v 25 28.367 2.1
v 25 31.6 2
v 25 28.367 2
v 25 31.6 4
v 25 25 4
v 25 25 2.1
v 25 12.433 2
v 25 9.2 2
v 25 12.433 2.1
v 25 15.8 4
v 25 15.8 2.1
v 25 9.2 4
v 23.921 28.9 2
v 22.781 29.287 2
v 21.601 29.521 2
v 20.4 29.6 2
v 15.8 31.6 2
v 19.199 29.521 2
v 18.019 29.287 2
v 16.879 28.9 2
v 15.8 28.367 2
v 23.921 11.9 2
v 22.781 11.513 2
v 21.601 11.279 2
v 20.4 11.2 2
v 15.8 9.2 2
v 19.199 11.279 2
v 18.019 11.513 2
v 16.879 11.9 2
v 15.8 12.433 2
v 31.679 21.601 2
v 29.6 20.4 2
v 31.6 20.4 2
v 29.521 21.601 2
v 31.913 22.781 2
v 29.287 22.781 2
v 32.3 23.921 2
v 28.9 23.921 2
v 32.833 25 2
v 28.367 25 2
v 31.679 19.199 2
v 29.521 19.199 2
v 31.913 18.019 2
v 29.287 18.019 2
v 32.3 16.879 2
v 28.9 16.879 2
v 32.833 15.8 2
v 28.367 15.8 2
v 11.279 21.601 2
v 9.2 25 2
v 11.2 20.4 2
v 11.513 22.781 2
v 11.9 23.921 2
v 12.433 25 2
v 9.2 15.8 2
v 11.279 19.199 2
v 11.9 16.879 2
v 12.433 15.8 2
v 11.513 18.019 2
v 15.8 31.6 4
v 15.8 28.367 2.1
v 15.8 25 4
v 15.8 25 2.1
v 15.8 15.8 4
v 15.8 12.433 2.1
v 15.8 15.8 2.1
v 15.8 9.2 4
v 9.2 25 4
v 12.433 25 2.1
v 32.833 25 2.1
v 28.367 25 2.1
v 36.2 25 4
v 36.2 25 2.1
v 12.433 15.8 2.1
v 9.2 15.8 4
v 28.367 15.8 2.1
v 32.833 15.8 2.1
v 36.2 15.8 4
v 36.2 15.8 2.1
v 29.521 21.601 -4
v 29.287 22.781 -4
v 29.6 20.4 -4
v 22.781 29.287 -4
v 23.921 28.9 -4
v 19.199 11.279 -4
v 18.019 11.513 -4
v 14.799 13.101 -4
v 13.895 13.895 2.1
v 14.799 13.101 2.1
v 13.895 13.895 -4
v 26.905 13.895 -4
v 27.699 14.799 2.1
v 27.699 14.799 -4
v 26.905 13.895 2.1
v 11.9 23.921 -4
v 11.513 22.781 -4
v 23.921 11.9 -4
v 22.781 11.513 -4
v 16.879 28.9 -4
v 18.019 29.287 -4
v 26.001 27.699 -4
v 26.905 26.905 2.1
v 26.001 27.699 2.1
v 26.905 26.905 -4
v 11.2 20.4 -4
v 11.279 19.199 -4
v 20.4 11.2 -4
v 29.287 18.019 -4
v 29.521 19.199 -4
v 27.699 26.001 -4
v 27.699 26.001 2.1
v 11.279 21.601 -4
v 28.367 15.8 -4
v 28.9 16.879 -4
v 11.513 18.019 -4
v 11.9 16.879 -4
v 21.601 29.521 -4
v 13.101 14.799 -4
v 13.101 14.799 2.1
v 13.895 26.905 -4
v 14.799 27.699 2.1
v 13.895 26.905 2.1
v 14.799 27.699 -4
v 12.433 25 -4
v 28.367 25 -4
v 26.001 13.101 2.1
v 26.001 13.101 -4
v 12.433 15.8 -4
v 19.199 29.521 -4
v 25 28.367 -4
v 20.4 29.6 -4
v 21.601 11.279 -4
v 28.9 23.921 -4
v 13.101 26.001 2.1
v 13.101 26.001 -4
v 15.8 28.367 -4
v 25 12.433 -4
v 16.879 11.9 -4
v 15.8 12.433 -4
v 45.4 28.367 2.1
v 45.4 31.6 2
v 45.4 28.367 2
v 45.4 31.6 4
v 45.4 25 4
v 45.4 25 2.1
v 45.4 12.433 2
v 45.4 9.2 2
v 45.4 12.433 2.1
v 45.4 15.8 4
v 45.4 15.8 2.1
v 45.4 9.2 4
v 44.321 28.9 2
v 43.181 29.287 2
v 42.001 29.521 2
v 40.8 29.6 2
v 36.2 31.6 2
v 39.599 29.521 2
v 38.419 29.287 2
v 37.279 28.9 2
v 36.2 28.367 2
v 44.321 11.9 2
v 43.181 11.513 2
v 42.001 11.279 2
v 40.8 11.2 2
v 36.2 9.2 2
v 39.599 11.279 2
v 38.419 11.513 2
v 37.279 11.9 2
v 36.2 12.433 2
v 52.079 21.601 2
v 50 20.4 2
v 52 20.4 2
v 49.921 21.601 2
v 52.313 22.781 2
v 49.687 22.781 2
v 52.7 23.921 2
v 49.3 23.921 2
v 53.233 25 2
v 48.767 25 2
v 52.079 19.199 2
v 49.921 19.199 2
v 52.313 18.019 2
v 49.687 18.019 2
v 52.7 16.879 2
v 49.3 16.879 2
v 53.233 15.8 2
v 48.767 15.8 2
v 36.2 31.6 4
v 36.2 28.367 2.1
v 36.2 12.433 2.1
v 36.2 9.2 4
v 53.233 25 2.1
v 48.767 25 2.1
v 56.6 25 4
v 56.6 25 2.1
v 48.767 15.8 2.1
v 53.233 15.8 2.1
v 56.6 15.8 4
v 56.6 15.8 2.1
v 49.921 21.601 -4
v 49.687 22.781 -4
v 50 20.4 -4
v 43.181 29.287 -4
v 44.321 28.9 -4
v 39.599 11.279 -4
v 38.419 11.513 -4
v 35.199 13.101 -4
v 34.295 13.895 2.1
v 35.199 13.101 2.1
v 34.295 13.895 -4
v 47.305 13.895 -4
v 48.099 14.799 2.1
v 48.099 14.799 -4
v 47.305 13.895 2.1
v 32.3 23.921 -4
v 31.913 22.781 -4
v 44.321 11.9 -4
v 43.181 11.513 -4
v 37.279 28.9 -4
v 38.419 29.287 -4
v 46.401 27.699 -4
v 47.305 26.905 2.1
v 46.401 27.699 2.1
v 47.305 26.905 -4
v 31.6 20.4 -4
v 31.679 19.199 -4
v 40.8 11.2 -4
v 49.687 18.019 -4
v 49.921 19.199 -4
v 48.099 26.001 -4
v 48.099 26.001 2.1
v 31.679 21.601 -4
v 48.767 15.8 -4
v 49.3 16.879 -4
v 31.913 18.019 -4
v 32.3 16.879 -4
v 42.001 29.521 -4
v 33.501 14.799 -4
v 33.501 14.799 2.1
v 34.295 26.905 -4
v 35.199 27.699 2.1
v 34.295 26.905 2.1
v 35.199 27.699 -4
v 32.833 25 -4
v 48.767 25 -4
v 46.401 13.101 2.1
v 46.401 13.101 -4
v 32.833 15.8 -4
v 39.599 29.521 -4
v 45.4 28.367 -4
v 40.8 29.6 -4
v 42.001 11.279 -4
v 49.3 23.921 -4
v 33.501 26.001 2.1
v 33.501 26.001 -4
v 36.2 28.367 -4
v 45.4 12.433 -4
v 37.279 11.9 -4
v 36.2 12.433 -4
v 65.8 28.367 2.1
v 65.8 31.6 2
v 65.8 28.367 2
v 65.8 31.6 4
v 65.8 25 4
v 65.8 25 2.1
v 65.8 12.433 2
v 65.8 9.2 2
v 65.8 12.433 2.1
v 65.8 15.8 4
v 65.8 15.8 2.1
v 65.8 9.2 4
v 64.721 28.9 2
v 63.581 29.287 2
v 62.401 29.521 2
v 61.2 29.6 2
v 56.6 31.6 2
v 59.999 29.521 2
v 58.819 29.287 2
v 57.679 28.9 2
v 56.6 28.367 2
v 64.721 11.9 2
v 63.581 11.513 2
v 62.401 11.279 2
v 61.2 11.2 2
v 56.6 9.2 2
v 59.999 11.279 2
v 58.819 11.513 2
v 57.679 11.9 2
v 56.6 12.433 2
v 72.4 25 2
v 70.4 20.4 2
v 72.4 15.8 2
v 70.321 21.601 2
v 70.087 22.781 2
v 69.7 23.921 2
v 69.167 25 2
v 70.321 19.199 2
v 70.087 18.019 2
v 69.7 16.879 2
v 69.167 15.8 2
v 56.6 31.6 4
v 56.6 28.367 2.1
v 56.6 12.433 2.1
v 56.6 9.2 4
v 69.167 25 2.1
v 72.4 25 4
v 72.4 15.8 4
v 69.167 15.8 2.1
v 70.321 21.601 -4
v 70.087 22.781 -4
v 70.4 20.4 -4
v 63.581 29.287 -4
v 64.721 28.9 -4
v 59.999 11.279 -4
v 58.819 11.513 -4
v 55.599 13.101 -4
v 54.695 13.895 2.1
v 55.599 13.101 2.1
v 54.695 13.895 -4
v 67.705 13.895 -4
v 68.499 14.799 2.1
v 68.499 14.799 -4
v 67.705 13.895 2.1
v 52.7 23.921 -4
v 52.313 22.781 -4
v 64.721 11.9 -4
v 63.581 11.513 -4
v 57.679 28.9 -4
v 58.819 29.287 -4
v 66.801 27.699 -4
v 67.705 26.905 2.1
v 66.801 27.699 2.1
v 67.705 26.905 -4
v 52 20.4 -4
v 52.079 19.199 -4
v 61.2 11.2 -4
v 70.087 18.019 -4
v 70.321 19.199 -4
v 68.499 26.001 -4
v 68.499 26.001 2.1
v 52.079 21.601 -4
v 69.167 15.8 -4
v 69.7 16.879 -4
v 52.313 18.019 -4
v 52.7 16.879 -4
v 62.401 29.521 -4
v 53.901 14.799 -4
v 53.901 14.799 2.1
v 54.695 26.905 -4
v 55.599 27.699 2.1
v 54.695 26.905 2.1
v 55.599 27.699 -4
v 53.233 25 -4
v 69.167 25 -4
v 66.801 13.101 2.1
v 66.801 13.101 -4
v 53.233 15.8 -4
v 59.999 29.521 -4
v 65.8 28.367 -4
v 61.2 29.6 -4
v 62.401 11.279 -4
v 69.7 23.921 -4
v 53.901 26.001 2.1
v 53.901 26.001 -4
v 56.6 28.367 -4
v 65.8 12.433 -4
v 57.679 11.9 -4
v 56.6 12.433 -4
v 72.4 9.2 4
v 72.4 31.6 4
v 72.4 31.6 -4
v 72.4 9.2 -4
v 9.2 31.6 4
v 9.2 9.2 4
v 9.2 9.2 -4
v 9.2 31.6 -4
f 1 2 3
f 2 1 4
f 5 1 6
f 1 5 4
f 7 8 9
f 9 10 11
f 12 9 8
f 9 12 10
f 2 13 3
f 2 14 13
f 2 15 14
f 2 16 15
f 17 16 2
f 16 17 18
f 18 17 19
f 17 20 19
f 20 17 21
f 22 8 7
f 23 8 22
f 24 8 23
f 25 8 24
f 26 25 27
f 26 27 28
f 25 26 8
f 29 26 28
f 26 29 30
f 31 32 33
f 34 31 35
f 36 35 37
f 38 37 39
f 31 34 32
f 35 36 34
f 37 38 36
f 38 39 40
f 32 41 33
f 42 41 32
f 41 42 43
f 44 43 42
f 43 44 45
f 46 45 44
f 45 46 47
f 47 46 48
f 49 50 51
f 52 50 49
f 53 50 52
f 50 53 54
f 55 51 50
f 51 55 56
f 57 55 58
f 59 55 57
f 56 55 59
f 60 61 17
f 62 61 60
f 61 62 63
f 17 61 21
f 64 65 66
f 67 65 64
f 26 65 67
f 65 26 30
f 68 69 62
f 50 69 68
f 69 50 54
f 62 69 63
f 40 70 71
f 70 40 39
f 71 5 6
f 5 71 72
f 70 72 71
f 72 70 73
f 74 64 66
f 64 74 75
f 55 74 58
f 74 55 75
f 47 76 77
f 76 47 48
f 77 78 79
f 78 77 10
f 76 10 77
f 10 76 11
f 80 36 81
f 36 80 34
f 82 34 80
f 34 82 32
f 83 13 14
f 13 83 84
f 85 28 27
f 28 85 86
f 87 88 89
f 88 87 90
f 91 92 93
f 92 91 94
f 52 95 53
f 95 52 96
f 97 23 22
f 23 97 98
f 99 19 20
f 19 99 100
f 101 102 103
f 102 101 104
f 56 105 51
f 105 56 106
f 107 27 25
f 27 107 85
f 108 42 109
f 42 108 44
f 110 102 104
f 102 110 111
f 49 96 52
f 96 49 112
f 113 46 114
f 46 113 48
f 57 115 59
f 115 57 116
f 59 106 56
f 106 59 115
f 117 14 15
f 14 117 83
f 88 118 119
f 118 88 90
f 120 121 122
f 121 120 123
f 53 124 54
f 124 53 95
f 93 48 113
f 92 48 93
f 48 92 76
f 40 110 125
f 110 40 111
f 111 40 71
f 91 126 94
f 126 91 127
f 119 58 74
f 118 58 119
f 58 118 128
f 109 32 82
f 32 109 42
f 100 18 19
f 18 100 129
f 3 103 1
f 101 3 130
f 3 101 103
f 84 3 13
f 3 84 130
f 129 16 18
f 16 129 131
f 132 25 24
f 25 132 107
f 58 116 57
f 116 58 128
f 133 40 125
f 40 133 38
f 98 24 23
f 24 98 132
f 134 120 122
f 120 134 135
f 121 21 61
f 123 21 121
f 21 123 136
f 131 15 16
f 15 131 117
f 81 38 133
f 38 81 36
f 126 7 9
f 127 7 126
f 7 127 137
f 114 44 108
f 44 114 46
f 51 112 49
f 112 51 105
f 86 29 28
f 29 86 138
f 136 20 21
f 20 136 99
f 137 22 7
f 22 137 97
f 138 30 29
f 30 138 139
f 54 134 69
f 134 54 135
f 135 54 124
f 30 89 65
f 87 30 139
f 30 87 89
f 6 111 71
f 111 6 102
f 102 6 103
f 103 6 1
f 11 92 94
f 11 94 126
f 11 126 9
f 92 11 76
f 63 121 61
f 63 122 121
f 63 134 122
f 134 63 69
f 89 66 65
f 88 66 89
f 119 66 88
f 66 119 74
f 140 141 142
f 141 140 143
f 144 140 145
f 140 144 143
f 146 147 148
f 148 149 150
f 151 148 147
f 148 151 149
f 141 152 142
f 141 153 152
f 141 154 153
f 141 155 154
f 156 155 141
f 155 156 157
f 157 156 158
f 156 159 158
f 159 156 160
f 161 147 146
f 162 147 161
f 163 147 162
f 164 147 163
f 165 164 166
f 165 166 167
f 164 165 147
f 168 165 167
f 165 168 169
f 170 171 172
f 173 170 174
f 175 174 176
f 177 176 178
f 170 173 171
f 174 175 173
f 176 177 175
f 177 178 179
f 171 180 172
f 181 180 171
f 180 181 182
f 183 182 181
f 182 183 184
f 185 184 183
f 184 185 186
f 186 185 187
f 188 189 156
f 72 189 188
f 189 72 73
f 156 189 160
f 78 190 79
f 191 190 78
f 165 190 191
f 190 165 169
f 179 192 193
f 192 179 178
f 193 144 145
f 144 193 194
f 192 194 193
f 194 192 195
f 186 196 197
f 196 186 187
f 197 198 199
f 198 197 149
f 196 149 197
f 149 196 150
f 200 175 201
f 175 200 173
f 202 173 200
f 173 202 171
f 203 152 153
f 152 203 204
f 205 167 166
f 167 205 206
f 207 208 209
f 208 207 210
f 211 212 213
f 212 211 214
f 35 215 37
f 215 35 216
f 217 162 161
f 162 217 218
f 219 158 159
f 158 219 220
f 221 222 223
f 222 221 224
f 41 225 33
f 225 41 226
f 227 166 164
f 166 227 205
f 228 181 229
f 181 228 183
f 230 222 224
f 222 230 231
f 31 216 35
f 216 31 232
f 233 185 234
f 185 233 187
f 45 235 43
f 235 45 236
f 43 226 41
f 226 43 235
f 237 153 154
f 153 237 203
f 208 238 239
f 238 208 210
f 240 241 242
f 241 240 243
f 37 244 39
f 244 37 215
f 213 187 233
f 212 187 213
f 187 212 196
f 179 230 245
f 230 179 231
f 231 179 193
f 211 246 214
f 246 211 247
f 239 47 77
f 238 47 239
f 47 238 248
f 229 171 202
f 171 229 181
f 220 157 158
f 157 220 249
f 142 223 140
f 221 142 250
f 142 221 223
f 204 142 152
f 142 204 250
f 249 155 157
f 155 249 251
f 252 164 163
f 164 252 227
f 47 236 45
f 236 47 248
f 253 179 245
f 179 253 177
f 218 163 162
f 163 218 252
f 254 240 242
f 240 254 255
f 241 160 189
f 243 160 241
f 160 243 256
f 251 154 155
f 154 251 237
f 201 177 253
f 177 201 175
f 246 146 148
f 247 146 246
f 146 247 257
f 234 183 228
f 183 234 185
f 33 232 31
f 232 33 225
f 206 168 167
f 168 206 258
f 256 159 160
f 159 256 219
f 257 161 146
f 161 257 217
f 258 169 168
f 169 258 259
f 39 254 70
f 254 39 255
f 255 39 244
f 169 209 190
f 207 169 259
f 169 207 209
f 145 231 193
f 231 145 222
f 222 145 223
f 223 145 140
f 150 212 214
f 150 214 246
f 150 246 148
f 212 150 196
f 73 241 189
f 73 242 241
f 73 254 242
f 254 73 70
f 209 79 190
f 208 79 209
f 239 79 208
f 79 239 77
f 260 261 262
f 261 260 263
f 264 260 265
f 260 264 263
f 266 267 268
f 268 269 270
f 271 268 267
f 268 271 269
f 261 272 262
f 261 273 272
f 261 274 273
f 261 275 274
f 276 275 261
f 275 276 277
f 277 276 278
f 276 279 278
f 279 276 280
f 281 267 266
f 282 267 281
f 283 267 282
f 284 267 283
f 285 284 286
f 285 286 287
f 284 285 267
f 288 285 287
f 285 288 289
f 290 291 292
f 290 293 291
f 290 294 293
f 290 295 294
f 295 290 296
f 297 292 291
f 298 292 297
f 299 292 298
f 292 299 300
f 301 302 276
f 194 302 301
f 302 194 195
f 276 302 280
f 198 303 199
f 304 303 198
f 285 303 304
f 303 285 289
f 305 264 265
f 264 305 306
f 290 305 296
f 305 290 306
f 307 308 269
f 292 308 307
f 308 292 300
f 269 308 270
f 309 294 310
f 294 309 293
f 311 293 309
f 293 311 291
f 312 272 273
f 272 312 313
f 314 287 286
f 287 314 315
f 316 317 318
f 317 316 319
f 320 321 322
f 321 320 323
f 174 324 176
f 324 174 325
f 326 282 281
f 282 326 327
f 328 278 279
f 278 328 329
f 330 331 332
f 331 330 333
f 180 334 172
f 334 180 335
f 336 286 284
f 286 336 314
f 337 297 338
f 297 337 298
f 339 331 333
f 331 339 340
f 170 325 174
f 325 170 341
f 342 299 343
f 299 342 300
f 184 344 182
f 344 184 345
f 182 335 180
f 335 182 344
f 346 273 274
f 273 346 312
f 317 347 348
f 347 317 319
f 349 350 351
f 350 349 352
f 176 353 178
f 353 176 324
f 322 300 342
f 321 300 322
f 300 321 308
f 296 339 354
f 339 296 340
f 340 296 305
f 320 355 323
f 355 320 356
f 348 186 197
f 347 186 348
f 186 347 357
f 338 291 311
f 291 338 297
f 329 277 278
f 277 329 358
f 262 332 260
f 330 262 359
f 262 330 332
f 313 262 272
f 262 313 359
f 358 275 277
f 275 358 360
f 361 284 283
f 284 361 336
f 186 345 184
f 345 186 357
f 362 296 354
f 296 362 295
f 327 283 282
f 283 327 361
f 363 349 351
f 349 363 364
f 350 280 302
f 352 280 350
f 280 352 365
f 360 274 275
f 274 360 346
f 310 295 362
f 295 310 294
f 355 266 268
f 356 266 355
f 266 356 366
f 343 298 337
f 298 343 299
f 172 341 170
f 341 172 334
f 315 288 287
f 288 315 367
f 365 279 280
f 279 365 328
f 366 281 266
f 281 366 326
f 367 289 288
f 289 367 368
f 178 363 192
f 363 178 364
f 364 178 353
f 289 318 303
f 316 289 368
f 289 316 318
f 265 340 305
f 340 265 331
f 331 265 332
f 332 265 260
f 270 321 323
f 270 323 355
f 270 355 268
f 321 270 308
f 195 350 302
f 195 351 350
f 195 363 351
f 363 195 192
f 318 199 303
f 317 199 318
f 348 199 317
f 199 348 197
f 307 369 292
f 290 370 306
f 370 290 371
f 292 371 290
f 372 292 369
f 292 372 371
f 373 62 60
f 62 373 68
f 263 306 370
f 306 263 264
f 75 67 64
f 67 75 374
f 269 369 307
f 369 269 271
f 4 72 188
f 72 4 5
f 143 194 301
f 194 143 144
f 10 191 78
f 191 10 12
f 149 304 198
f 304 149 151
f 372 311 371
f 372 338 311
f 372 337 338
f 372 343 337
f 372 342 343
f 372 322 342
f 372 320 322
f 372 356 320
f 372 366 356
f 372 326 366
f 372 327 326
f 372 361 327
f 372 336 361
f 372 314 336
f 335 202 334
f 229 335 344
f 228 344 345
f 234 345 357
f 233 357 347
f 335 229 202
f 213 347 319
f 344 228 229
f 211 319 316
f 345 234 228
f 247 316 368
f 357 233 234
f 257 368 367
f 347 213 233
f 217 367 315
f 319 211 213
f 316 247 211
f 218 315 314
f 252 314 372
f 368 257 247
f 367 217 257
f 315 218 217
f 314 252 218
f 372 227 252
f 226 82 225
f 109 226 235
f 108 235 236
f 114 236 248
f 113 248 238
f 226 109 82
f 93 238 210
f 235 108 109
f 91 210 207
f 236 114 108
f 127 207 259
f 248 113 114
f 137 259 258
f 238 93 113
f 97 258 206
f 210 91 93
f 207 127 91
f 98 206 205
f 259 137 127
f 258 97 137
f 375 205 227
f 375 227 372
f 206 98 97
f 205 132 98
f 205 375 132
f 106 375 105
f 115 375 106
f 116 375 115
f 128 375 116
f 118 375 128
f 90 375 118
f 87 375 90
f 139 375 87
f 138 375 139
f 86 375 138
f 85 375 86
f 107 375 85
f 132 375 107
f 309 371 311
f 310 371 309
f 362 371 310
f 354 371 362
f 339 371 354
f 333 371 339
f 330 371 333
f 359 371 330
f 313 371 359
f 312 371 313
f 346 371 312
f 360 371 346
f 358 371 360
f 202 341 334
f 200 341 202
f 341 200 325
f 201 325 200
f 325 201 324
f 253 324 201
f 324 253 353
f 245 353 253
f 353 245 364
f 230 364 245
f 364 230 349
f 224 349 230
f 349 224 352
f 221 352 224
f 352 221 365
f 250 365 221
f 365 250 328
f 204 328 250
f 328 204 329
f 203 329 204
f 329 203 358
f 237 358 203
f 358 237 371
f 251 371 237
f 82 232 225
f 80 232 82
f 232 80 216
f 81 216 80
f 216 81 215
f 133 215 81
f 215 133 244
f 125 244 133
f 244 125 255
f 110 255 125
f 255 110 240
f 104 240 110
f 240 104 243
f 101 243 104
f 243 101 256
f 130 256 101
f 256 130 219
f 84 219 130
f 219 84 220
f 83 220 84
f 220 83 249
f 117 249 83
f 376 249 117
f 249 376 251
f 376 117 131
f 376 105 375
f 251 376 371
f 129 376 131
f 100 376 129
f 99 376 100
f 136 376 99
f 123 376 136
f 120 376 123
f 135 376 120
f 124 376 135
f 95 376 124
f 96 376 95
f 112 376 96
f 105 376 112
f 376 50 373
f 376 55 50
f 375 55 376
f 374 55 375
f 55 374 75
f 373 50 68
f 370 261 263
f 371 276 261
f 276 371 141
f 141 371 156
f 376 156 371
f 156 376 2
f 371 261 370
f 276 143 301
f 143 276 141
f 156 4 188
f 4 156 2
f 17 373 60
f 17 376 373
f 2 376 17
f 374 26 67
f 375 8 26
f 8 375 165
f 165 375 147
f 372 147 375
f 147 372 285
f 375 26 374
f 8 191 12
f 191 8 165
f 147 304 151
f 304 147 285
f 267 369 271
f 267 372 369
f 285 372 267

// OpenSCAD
// Cell Diameter
cell = 18.4;
// Number of Rows
rows = 3; // [0:10]
// Number of Columns
cols = 1; // [0:10]
// Holder Height
height = 8;
// Space betwen Cells
space = 2;

cubeSize = cell+space;

// number of faces in circle
$fn = 48; 
difference()
{
    translate([(rows+1)*cubeSize/2, (cols+1)*cubeSize/2, 0])
    cube(size = [cubeSize*rows+space, cubeSize*cols+space, height], center = true);
    
    for ( i = [1 : cols] )
    {
        translate([0,i*cubeSize,0])
        for ( ii = [1 : rows] )
        {
            translate([ii*cubeSize,0,0])
            
            union()
            {
                translate([0,0,height/2]) cube(size = [cell/2,cubeSize+3,4], center = true);
                translate([0,0,height/2]) cube(size = [cubeSize+3,cell/2,4], center = true); 
                translate([0,0,-height/2-1.9]) cylinder(h = height, r=cell/2);
            }
            
        }
    }
}

/*for ( i = [1 : numerical_slider2] )
{
    translate([0,i*(21),0])
    for ( i = [1 : numerical_slider] )
    {
        translate([i*(21),0,0])
        difference()
        {
            cube(size = [21,21,8], center = true);
            union()
            {
                translate([0,0,4]) cube(size = [10,23,4], center = true);
                translate([0,0,4]) cube(size = [23,10,4], center = true); 
            }
            translate([0,0,-5.99]) cylinder(h = 8, r=9.1);
        }
    }
}*/
